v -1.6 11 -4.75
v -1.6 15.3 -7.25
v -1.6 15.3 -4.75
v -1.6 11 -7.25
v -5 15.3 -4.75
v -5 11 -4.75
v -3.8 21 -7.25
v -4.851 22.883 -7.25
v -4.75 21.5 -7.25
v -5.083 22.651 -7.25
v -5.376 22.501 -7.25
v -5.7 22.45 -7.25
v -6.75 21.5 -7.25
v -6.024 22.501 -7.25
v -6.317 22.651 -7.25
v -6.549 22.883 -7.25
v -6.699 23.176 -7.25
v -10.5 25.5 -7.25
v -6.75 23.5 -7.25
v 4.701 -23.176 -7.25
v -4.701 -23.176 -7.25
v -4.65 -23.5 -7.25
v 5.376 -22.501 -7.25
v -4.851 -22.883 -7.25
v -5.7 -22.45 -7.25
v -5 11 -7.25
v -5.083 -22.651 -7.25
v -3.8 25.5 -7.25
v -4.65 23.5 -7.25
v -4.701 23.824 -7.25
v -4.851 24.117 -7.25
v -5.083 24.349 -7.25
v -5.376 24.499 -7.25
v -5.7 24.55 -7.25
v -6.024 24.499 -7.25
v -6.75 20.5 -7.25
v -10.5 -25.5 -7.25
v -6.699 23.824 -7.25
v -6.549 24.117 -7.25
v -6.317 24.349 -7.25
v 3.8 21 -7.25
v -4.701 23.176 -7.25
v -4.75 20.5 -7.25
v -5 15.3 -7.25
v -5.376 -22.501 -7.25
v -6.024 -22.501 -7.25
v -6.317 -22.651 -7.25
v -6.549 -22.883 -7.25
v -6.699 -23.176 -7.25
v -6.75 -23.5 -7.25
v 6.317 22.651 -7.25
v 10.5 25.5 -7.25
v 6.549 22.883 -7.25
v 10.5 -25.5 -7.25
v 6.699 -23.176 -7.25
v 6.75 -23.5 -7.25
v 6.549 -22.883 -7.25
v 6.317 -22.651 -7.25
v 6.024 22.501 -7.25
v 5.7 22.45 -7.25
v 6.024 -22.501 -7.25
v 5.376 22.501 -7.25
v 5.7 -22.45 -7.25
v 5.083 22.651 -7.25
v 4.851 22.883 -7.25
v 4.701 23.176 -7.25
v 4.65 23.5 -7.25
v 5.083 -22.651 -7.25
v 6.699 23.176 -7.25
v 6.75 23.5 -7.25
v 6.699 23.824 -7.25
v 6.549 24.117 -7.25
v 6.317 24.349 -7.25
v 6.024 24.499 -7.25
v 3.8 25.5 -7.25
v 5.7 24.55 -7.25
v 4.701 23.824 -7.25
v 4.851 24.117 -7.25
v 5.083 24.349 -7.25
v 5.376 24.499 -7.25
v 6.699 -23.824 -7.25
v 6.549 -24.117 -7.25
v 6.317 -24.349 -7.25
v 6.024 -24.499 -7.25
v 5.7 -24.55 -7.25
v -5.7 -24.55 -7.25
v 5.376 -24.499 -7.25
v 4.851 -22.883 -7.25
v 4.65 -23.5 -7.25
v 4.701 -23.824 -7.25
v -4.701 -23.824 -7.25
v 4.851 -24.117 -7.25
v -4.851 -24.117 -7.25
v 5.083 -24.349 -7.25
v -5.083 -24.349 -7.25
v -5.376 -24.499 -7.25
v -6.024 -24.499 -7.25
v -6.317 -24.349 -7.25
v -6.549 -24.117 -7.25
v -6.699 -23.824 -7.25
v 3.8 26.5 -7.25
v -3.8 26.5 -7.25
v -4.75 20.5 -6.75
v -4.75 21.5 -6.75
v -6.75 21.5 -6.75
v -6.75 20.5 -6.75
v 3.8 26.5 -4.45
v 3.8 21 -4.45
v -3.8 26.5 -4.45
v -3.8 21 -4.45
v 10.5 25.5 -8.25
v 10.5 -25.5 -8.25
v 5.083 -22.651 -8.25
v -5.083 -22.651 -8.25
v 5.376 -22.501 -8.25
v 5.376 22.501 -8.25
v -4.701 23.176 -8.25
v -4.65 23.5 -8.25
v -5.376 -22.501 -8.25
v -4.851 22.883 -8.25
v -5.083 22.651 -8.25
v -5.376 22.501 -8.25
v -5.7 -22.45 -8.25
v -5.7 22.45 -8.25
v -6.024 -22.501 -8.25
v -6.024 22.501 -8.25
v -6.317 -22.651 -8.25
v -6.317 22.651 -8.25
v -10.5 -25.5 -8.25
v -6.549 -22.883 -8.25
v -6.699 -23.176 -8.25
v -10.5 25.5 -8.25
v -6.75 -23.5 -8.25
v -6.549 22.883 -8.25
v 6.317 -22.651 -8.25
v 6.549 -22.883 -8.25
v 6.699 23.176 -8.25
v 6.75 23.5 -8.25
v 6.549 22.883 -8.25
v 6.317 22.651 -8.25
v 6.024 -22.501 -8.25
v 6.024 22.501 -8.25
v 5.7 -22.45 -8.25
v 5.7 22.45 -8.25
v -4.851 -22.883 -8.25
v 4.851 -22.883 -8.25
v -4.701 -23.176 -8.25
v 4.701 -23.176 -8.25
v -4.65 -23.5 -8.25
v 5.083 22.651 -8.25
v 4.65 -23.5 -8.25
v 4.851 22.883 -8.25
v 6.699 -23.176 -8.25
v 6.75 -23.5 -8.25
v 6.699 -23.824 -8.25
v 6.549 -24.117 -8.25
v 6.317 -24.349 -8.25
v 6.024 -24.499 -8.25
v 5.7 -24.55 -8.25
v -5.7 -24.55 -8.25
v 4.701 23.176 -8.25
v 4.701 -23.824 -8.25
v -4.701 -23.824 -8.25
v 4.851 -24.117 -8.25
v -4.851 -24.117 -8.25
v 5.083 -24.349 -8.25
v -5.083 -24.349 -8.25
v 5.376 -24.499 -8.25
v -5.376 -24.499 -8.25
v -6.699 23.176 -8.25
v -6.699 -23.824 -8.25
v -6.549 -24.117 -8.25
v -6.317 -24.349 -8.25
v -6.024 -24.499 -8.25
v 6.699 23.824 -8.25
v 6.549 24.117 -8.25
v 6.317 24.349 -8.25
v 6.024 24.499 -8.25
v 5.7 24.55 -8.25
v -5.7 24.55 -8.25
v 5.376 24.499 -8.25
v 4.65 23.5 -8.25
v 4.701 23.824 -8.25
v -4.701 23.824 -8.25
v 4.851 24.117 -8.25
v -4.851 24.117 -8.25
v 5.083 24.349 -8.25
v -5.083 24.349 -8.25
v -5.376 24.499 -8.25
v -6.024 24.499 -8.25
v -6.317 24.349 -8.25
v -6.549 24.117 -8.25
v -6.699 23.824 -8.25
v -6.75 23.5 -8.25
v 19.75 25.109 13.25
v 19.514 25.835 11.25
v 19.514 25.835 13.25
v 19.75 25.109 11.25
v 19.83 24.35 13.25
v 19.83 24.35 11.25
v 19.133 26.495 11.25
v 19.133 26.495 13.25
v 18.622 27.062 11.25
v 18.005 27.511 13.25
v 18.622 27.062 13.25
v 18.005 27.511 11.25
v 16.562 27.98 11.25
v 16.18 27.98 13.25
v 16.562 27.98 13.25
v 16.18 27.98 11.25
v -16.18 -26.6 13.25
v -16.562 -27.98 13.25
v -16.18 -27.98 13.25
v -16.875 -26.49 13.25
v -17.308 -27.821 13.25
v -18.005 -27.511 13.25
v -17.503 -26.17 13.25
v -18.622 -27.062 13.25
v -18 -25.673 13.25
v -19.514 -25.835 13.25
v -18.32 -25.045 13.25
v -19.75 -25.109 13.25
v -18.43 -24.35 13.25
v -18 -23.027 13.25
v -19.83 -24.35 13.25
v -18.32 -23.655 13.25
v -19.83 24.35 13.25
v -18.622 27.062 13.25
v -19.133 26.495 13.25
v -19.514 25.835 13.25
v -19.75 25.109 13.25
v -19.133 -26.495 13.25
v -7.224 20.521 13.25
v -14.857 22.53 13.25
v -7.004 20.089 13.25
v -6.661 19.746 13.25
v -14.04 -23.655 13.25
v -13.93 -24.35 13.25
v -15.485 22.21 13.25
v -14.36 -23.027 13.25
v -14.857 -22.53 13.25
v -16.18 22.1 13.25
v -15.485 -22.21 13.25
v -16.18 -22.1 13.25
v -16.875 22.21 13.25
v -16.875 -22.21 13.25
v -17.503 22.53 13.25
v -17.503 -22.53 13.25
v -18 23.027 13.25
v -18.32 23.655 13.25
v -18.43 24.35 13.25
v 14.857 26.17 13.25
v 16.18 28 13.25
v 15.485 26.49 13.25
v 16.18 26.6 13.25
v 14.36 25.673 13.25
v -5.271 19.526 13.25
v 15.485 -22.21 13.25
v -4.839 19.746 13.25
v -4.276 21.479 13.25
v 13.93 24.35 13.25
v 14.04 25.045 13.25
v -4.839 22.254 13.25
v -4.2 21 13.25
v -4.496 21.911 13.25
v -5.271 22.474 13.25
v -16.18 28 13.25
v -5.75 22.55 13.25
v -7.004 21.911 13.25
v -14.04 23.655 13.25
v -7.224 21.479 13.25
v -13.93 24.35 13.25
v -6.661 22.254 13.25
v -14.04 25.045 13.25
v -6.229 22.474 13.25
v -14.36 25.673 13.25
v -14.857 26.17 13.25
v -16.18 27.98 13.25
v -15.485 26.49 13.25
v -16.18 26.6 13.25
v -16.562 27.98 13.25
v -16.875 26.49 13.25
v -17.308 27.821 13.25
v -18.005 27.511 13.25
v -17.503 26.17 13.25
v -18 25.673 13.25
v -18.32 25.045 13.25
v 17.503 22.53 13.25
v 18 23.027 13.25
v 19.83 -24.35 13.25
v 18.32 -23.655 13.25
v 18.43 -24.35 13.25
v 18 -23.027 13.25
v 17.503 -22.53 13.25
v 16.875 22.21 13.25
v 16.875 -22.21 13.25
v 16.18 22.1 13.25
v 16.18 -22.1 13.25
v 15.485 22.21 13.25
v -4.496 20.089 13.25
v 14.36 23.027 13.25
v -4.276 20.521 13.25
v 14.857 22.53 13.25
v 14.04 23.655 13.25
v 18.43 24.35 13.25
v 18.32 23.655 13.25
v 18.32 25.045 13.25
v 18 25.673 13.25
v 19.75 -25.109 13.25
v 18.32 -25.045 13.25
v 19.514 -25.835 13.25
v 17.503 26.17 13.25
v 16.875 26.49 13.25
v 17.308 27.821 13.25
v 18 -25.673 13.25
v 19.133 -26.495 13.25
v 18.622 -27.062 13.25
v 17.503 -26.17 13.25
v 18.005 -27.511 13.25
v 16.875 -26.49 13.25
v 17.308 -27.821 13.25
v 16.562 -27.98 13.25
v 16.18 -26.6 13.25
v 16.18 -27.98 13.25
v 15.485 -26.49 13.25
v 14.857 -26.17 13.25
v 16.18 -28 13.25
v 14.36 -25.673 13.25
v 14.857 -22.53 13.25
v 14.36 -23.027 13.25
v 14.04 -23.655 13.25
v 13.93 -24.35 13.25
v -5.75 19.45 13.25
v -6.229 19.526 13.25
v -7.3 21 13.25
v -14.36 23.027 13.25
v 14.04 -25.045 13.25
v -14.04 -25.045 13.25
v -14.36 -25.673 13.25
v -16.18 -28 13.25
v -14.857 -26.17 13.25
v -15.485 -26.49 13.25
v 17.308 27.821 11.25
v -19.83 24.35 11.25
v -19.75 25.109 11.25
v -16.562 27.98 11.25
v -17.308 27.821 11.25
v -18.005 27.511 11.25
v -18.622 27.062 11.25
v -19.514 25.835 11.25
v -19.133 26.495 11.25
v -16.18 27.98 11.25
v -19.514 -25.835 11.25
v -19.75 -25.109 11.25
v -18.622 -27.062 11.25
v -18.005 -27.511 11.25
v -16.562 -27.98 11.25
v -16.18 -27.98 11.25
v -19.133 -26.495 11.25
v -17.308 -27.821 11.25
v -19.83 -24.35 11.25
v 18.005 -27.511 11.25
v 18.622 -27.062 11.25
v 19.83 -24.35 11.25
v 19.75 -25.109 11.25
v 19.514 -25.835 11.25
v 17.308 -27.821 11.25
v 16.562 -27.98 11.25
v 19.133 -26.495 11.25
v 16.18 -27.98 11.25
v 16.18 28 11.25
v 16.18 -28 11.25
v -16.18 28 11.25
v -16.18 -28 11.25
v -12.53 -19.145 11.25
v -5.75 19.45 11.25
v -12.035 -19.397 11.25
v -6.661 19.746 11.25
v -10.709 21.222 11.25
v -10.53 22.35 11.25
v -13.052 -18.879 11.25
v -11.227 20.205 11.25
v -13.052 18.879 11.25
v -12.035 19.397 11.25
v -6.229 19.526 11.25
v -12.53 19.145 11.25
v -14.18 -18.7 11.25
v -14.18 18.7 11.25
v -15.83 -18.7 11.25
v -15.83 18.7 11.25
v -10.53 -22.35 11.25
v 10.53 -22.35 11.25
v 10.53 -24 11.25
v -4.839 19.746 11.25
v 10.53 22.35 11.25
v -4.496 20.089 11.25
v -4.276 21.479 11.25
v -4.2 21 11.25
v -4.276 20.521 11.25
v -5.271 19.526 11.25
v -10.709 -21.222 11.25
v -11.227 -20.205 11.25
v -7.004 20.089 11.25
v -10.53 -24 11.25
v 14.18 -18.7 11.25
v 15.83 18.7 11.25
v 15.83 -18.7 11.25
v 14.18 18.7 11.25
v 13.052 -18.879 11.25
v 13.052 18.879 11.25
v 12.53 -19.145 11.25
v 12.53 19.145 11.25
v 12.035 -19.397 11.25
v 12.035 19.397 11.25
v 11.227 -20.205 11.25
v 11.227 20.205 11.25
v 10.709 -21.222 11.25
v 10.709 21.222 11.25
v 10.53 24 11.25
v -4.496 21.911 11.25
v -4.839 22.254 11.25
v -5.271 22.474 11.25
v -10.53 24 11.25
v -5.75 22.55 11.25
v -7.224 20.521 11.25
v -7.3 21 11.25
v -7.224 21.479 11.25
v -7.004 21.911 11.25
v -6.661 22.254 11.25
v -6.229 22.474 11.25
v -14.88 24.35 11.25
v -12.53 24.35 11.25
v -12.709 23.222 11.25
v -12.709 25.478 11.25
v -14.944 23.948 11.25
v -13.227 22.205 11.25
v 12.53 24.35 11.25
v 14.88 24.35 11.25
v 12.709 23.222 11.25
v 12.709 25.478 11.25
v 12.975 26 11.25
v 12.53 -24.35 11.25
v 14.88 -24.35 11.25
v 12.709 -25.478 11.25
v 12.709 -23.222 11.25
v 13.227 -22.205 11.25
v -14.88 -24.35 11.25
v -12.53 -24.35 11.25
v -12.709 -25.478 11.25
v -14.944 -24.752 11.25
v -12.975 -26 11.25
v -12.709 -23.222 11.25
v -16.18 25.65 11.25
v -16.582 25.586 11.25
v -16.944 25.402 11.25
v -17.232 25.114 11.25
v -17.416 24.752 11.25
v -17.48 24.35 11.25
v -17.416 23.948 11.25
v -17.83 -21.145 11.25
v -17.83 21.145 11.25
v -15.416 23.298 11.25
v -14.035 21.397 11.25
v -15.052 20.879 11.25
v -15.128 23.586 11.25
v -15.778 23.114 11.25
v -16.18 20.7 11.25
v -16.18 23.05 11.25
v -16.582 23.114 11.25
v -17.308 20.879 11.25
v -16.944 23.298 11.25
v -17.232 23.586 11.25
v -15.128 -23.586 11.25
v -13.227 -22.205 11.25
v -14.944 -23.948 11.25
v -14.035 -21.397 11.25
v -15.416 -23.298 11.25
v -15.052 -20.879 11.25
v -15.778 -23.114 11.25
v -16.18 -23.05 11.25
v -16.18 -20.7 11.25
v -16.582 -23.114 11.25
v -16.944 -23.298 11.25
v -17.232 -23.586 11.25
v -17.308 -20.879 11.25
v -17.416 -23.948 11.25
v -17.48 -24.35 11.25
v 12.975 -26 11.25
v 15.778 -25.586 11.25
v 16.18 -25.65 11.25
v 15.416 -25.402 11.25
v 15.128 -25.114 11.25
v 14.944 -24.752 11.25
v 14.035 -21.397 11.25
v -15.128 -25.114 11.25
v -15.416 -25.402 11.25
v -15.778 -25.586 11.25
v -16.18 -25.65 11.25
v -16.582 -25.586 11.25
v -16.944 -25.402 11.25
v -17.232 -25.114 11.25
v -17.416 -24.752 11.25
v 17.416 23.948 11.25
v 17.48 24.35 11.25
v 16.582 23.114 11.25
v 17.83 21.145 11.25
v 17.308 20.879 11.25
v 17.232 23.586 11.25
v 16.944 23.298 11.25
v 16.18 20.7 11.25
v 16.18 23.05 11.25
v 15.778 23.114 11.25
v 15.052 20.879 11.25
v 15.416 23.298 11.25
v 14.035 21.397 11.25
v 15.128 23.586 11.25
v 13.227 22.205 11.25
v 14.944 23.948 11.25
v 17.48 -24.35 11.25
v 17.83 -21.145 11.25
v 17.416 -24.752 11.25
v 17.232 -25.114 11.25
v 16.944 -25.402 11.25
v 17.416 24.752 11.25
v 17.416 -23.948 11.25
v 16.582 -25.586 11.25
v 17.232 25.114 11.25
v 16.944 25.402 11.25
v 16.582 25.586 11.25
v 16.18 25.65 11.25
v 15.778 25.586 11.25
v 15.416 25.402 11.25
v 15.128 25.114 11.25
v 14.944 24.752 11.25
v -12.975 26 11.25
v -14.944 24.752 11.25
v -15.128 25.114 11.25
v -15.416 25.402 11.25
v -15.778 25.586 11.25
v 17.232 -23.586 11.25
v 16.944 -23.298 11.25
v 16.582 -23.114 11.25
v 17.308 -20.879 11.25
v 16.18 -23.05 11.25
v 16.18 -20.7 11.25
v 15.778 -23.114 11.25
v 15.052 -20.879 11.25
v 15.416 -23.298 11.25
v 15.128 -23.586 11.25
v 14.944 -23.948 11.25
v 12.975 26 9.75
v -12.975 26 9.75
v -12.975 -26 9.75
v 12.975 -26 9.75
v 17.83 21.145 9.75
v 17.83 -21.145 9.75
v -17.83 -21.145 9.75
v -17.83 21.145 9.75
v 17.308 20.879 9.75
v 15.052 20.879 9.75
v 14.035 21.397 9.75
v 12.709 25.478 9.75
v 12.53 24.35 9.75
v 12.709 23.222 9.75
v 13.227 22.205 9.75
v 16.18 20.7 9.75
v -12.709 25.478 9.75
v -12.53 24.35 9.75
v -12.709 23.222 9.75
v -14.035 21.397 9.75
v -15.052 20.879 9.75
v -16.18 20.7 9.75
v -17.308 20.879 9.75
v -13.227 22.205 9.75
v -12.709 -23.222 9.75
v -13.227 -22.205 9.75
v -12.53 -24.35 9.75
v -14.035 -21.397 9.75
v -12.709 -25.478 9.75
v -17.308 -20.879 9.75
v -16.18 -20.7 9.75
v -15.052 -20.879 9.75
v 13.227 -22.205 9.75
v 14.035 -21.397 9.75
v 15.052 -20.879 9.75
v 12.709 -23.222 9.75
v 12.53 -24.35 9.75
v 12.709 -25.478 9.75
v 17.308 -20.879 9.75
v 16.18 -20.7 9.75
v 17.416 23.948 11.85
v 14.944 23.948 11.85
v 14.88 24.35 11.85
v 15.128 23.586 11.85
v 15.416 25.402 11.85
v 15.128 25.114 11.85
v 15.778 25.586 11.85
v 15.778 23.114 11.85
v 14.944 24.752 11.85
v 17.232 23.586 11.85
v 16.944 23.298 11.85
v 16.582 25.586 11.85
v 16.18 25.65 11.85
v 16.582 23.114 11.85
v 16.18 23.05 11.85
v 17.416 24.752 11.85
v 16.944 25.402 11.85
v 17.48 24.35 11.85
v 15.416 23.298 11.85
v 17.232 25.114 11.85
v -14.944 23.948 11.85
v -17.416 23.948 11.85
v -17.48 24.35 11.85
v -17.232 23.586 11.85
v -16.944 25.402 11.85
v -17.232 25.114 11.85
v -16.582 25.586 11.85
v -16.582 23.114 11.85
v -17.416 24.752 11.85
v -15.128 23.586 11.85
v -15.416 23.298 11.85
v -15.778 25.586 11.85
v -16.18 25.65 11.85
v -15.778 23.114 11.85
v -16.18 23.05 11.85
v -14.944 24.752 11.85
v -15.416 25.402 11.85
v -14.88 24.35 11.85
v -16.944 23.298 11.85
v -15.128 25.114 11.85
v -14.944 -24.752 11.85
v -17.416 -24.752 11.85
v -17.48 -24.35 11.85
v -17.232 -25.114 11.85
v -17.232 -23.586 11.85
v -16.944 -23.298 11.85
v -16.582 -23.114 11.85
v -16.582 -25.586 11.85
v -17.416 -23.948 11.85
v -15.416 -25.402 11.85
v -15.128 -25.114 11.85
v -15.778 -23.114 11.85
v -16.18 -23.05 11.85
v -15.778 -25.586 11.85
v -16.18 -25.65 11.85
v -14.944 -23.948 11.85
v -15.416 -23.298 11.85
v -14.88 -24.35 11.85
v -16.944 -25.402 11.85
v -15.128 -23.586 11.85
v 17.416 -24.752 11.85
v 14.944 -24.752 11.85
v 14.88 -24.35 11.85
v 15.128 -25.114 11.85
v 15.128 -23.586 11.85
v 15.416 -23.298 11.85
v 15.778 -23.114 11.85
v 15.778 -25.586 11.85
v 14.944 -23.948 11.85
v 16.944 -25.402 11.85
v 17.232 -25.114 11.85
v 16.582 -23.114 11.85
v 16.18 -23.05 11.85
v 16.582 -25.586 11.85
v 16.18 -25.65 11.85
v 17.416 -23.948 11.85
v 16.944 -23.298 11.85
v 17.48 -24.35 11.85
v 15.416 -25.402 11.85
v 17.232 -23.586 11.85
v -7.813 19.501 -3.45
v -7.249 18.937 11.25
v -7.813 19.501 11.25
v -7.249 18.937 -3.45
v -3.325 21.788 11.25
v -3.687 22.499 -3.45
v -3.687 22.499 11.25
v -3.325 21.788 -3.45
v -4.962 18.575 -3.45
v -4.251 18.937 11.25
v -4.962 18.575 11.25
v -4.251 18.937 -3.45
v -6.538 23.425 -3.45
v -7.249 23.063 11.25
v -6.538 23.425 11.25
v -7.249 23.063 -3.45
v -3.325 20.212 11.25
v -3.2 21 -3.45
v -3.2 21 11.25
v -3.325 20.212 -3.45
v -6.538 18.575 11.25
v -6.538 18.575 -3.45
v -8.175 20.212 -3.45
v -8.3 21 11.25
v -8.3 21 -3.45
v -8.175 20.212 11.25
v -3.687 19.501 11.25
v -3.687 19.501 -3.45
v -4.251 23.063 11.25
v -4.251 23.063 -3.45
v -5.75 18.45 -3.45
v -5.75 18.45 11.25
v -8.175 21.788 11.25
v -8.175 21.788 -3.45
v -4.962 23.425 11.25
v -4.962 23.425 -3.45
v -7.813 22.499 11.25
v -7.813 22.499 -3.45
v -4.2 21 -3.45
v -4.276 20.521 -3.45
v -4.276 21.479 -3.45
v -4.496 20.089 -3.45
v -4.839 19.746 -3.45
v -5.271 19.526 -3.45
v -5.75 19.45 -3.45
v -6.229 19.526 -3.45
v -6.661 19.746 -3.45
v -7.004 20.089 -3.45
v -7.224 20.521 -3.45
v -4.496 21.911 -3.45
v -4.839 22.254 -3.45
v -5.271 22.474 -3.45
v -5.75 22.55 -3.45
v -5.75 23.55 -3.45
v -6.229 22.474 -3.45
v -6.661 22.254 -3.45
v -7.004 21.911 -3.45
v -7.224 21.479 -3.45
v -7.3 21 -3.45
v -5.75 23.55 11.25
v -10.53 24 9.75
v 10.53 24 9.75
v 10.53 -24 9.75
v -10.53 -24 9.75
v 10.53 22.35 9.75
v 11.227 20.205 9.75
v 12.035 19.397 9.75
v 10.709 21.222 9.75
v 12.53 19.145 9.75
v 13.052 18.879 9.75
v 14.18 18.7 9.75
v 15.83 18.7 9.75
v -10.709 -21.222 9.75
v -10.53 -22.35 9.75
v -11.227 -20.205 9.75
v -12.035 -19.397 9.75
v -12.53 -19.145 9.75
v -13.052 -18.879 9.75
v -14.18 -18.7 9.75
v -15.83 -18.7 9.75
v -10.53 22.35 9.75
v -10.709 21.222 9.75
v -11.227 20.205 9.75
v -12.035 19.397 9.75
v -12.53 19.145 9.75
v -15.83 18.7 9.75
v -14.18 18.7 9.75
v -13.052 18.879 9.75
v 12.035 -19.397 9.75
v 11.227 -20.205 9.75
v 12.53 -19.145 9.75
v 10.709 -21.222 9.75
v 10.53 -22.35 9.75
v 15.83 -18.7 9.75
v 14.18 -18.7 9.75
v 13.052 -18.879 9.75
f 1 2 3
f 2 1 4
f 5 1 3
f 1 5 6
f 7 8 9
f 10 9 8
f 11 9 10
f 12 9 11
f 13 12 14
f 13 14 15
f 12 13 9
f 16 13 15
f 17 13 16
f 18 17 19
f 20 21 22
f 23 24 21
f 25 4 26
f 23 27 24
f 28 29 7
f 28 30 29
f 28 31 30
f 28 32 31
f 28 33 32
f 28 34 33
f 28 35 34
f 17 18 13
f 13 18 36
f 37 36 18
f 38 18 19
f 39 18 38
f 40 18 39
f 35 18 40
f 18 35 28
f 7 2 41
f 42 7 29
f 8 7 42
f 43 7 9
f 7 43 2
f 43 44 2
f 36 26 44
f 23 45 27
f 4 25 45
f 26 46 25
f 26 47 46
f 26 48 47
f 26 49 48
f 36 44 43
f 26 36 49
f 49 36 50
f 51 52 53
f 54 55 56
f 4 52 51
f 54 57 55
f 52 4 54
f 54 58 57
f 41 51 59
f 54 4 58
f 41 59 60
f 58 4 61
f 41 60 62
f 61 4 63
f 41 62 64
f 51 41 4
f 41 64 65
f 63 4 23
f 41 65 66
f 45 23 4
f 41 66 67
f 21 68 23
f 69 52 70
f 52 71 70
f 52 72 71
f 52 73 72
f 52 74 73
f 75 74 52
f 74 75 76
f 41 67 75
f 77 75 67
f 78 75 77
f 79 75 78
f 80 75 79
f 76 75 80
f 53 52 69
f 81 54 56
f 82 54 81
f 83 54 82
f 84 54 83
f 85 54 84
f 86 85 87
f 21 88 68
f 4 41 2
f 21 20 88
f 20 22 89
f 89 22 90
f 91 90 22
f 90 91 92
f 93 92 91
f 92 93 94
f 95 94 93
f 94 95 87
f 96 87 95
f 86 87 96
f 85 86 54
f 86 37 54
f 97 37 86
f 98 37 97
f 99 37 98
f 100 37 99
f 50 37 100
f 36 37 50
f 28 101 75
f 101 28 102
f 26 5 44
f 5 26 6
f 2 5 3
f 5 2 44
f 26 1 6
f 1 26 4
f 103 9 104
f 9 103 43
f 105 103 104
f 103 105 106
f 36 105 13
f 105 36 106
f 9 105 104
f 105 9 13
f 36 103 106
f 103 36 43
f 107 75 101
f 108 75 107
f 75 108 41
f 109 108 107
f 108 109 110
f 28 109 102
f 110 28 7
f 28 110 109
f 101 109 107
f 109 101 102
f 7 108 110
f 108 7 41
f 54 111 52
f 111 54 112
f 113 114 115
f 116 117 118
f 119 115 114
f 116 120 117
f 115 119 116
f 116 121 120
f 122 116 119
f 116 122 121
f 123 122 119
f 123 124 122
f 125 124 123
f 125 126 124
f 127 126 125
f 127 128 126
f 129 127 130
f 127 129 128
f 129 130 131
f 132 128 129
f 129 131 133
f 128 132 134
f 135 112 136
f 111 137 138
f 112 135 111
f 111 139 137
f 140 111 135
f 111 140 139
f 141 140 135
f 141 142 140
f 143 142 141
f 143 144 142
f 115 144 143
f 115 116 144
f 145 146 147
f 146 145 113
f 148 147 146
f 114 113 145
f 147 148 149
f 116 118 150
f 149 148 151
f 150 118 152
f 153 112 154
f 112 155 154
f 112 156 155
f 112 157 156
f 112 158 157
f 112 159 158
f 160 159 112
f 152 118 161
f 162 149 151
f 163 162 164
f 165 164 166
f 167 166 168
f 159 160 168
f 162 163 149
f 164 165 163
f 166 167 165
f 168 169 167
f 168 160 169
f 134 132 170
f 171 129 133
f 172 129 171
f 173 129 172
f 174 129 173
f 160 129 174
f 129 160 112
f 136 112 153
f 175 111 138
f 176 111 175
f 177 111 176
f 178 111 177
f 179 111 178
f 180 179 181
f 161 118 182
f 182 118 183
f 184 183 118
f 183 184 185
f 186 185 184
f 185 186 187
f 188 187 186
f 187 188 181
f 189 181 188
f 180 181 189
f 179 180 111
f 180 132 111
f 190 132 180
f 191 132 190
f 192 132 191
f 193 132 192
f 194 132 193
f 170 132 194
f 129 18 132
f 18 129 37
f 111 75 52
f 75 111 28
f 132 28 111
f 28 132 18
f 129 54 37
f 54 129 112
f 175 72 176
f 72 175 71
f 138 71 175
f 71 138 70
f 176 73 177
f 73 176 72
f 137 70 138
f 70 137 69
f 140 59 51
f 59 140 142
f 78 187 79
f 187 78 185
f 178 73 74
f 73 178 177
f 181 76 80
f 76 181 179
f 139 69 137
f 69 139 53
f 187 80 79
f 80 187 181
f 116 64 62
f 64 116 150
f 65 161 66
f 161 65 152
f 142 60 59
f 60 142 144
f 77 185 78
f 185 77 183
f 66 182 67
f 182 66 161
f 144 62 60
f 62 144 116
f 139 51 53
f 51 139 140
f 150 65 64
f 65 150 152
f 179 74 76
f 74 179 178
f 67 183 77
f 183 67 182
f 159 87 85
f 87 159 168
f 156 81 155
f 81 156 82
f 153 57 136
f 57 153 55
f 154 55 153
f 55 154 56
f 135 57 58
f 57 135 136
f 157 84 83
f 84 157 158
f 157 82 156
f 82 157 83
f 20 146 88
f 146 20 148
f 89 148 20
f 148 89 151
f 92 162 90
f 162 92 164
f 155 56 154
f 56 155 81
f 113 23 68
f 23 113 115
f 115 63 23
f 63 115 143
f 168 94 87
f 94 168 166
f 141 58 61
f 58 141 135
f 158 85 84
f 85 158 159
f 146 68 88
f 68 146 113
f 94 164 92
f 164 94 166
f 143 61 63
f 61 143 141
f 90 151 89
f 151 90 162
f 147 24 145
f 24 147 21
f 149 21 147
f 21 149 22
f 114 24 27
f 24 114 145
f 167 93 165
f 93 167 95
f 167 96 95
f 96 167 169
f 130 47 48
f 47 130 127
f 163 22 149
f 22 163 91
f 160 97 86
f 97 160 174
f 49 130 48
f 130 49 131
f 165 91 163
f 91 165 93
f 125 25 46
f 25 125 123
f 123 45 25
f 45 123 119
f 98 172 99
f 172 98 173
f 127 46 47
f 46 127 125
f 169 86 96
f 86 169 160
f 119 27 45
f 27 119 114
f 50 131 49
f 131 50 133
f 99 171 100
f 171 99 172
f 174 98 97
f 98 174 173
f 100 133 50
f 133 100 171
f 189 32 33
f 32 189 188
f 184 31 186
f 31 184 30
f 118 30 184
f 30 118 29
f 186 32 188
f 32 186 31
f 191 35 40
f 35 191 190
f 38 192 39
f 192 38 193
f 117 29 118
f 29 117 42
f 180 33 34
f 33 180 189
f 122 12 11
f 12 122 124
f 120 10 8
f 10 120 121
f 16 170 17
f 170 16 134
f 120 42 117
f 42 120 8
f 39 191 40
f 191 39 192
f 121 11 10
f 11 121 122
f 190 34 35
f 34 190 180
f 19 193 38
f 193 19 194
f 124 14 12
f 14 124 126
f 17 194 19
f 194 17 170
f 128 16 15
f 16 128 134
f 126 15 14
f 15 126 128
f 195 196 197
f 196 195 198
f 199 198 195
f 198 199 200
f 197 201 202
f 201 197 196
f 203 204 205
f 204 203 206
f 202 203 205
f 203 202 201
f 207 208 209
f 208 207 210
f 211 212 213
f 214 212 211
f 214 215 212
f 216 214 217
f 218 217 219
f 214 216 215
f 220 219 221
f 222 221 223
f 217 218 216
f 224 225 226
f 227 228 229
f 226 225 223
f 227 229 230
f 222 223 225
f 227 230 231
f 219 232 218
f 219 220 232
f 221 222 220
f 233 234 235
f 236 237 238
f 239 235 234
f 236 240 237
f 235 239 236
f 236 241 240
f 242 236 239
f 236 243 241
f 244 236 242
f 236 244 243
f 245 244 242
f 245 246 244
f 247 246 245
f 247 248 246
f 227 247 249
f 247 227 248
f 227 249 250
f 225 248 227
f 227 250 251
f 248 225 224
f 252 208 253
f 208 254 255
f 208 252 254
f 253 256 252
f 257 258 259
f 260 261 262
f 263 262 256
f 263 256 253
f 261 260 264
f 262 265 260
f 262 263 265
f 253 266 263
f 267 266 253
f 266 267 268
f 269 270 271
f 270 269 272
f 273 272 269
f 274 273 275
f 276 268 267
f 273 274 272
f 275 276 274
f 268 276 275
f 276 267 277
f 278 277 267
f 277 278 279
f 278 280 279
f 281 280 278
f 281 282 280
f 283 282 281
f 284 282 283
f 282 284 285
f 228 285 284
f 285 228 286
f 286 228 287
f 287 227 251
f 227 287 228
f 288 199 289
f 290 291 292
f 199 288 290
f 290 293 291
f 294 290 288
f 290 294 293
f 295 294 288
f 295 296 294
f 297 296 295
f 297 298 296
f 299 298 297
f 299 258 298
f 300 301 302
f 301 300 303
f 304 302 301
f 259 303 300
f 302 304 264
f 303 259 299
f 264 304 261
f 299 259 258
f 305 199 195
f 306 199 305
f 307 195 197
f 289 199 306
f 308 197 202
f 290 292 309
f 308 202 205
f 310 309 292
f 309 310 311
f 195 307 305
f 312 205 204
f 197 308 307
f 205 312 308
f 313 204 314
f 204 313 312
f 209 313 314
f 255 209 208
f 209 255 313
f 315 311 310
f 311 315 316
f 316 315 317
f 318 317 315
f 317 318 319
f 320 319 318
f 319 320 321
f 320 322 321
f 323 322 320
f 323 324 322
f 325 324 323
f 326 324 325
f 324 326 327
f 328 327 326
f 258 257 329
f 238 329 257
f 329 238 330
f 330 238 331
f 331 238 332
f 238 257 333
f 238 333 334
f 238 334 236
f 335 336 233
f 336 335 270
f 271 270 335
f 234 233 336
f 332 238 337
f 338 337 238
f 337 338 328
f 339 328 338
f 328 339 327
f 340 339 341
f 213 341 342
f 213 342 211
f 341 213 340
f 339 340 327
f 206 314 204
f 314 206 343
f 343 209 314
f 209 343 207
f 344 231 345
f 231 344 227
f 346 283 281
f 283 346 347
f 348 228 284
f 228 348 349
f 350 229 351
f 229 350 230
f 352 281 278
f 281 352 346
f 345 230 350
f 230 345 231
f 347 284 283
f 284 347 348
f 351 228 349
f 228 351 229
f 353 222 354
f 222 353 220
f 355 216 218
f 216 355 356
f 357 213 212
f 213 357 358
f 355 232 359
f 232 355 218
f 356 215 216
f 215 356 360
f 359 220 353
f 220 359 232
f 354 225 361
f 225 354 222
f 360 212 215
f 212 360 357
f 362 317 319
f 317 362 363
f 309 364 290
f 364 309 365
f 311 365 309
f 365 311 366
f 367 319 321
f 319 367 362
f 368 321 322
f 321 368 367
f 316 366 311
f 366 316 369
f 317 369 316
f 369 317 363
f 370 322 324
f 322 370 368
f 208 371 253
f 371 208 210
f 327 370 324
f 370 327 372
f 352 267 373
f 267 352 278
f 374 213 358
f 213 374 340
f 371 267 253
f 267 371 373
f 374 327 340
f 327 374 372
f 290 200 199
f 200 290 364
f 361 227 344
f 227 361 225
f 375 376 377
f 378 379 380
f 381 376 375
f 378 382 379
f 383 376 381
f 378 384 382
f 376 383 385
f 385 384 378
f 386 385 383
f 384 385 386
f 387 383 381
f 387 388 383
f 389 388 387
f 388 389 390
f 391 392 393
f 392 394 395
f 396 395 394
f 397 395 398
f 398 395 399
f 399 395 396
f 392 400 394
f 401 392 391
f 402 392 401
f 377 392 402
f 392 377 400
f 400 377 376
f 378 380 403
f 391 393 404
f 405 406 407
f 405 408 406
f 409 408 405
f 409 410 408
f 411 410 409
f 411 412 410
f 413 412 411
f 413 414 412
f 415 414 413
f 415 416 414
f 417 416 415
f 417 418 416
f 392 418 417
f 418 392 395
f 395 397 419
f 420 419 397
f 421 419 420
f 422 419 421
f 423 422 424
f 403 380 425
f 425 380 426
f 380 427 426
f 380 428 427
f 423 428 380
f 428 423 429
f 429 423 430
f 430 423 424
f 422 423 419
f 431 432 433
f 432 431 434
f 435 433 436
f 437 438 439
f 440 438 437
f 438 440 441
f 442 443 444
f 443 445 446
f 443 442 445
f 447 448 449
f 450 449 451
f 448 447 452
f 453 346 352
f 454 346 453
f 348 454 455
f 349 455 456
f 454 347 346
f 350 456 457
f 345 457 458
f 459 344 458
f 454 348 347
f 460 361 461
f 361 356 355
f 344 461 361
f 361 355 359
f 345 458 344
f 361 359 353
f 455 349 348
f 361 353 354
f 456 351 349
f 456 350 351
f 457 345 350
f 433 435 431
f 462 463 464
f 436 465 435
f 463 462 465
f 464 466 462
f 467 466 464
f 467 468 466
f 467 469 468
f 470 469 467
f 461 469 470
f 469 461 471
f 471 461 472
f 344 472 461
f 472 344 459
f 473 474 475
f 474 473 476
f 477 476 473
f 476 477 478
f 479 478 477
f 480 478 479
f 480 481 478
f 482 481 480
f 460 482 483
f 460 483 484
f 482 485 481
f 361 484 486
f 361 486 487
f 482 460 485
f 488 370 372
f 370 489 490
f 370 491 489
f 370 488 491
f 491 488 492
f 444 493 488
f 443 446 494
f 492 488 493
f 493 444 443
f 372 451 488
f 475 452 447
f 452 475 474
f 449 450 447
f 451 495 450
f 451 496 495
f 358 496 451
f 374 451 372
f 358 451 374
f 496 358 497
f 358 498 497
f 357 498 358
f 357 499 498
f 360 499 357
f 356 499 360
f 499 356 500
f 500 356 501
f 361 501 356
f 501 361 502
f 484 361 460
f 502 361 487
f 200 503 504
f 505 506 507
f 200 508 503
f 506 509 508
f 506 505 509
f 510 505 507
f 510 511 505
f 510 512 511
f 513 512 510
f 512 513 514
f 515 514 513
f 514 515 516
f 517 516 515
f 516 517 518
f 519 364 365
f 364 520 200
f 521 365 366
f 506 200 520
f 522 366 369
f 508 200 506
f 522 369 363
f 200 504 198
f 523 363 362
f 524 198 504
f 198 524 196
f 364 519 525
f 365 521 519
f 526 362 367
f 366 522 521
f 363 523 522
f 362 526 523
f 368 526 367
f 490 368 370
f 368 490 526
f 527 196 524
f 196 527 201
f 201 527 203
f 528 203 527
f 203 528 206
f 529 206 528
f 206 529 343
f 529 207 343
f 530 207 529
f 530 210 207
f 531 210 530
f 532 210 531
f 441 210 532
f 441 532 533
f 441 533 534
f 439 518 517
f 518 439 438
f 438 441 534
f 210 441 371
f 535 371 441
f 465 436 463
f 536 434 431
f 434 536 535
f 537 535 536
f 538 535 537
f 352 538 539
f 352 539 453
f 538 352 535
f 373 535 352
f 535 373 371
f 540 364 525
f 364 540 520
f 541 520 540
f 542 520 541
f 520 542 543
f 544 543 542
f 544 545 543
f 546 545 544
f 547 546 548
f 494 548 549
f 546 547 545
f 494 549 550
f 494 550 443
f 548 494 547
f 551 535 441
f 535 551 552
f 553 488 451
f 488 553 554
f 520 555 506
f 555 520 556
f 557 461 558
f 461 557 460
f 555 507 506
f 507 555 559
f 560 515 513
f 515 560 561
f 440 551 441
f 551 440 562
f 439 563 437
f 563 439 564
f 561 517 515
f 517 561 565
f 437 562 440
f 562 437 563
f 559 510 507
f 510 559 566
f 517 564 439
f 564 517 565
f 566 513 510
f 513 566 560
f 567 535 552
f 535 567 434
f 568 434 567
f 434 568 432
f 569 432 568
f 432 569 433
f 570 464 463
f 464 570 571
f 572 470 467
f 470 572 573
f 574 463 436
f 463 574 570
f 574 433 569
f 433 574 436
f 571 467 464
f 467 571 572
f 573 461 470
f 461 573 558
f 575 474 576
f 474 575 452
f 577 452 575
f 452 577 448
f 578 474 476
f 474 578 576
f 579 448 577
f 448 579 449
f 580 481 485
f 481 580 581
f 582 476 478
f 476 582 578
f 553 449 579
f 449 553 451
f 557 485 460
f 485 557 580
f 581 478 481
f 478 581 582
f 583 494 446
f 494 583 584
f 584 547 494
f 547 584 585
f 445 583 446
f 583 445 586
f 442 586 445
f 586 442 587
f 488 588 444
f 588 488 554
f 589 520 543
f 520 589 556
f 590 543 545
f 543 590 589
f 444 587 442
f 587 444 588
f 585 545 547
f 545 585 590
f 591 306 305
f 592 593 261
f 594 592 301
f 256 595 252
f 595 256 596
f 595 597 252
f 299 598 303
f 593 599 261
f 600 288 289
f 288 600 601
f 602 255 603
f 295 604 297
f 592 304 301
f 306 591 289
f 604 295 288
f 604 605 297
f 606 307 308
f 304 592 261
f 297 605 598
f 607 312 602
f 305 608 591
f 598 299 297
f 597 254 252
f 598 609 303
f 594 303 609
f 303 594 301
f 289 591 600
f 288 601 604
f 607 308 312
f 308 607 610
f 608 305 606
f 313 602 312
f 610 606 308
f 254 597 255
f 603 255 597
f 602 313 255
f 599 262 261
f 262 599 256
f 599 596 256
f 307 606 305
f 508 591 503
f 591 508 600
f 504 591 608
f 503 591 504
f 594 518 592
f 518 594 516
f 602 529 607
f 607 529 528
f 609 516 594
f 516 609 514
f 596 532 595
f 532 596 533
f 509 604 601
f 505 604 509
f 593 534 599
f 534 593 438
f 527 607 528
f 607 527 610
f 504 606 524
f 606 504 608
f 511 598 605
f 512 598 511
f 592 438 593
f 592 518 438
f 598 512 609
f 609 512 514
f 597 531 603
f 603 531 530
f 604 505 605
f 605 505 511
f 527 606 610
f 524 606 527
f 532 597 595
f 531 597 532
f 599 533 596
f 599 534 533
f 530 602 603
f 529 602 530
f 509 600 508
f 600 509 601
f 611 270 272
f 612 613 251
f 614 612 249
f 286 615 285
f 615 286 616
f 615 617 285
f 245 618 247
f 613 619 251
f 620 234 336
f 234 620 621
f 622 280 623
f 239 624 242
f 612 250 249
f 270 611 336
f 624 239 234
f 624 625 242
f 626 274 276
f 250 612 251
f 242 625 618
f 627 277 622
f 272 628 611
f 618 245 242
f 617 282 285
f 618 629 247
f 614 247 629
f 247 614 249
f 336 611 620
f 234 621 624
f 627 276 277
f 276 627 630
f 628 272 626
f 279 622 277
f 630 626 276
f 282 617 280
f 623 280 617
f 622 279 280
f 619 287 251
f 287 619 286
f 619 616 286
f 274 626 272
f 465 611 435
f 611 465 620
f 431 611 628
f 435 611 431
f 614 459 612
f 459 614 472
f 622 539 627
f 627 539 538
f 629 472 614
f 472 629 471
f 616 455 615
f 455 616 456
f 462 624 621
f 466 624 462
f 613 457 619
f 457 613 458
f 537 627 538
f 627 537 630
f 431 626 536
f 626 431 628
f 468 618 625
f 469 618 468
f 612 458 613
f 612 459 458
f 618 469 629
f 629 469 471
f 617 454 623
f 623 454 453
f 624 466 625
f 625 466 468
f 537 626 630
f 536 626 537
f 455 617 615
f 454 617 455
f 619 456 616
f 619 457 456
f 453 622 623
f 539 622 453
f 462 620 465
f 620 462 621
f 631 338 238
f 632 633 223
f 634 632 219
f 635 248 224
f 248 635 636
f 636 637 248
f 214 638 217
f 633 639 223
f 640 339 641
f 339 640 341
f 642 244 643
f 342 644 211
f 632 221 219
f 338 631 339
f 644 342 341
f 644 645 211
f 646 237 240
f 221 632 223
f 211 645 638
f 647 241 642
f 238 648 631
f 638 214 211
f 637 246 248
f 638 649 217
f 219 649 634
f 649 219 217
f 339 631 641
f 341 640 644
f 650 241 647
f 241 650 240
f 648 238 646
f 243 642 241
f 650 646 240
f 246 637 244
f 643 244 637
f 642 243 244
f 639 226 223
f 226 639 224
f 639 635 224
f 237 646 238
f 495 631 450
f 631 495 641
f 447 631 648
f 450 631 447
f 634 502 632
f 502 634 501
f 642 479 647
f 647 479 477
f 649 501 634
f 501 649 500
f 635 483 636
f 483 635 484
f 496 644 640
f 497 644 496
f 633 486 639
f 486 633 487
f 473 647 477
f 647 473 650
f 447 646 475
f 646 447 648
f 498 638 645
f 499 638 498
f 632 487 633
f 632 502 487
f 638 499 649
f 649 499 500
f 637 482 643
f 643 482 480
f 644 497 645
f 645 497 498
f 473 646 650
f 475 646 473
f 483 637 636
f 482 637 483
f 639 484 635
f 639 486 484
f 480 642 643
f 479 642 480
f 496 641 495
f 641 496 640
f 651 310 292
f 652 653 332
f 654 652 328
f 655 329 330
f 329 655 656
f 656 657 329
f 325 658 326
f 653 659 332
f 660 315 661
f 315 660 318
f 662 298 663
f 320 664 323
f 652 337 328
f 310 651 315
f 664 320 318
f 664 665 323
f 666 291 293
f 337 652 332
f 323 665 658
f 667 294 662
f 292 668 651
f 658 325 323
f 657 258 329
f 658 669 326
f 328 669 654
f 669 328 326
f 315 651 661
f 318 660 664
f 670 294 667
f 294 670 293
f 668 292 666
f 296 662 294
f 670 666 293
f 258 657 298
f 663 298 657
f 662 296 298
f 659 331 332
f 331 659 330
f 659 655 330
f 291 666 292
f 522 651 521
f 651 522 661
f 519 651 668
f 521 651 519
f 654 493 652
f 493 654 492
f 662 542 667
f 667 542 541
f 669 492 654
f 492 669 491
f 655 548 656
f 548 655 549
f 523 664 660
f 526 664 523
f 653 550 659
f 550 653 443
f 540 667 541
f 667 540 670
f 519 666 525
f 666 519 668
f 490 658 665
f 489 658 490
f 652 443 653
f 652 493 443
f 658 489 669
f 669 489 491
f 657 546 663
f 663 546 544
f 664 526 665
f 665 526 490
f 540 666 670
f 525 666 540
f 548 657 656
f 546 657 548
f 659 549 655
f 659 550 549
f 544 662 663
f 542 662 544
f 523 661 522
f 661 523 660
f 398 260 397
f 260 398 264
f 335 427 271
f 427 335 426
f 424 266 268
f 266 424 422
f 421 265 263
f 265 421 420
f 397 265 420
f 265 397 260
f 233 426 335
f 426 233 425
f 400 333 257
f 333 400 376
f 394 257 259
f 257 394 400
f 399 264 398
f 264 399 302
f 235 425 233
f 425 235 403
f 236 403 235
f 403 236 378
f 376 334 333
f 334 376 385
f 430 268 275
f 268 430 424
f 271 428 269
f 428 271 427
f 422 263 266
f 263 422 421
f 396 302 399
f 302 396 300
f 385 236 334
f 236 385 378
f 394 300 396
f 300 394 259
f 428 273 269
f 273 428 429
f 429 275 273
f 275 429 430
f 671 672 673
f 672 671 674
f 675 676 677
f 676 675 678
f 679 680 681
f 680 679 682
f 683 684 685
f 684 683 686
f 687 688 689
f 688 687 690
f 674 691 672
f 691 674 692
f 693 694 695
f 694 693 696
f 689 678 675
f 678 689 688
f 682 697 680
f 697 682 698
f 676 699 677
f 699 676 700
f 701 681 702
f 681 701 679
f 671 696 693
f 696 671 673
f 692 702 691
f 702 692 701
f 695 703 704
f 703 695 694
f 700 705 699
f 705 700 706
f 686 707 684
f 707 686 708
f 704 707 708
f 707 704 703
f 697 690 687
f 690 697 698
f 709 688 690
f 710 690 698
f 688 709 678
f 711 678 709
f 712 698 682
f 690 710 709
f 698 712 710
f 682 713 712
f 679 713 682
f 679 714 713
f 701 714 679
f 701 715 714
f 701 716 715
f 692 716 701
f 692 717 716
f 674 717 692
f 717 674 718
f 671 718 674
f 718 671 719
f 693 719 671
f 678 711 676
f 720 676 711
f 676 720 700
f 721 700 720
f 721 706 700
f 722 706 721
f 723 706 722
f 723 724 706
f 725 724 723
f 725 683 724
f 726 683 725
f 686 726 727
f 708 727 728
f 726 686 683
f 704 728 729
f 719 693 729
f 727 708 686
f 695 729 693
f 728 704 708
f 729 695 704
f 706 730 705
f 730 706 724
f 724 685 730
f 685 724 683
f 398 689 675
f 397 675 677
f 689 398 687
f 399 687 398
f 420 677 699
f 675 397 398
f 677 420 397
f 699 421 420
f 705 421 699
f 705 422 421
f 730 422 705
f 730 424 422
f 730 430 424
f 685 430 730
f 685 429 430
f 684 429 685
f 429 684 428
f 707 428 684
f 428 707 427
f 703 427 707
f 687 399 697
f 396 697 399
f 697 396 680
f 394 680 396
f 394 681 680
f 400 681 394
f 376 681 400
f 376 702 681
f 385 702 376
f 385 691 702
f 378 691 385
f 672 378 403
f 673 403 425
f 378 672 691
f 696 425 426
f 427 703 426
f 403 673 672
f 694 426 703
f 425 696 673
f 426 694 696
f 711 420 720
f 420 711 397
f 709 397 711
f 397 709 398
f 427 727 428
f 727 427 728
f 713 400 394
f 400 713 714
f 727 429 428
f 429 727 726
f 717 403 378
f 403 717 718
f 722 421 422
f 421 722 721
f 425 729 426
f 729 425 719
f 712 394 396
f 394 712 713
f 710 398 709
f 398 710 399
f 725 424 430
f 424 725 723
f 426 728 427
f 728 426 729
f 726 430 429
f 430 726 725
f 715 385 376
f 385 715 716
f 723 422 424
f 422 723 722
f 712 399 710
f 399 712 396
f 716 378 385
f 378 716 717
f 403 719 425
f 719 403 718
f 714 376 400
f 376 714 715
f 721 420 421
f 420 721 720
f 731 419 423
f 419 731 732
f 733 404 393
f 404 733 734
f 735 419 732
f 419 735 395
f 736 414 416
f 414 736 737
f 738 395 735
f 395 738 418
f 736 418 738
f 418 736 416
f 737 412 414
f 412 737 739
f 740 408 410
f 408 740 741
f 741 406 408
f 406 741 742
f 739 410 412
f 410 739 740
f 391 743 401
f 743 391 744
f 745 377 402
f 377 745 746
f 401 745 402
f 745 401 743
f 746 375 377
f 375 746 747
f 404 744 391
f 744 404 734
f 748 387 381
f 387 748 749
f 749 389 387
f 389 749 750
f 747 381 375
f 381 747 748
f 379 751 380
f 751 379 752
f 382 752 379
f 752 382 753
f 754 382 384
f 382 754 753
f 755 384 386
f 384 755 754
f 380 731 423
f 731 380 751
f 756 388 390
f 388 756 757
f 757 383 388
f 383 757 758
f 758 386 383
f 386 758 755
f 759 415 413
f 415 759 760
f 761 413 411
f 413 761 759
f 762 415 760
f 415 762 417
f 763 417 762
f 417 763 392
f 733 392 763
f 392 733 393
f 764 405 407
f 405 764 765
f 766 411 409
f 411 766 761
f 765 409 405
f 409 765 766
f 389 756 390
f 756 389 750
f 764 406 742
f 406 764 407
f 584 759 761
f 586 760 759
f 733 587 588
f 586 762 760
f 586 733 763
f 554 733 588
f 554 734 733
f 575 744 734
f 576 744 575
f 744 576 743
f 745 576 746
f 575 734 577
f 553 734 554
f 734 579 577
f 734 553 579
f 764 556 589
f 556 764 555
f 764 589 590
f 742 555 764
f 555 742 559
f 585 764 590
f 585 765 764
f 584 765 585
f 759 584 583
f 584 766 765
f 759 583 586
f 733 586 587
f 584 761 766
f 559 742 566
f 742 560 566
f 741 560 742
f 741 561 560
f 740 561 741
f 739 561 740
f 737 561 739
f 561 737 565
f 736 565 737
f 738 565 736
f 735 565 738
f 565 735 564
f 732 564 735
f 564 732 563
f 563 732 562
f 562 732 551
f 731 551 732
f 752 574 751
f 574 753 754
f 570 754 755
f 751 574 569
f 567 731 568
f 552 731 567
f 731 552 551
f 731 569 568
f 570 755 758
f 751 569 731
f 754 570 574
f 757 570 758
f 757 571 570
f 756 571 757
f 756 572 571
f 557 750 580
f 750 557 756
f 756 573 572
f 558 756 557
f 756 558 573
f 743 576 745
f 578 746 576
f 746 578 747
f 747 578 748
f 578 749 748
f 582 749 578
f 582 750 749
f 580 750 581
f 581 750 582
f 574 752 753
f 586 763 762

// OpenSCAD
// file: utilities.scad
module corners(x_size, y_size){
    for(p = [[x_size/2, y_size/2, 0],
            [-x_size/2, y_size/2, 0],
            [-x_size/2, -y_size/2, 0],
            [x_size/2, -y_size/2, 0]]) {
        translate(p){
            children();
        }
    }
}

module rounded_rectangle(x, y, z, radius){
    union(){
        cube([x - 2 * radius, y, z], center=true);
        cube([x, y - 2 * radius, z], center=true);

        corners(x - 2 * radius, y - 2 * radius){
            cylinder(r = radius, h = z, center=true, $fn=30);
        }
    }
}

module bolt_hole(diameter, countersink_depth){
//    countersink_depth = 1.4;
//    diameter = 2.5;
    union(){
        rotate_extrude(angle=360, $fn=20){
            polygon([[0,0], [0, countersink_depth], [diameter/2, countersink_depth], [2.25, 0]]);
        }
        translate([0, 0, countersink_depth/2]){
            cylinder(r=diameter/2, h=20, $fn=20);
            
        }
    }
}

// See https://cubehero.com/2013/12/31/creating-cookie-cutters-using-offsets-in-openscad/comment-page-1/
bounding_box = [5000, 5000, 5000];
module invert(bounds = bounding_box) {
    difference() {
        cube(bounds, true);
        children();
    }        
}

module inset(thickness, bounds = bounding_box){
    invert(bounds * 0.9){
        minkowski(){
            invert(){
                children();
            }
            cube([2 * thickness, 2 * thickness, 2 * thickness], center=true);
        }
    }
}

module xy_inset(thickness, bounds = bounding_box){
    difference(){
        children();

        scale([1, 1, 2]){
            inset(thickness, bounds) {
                children();
            }
        }
    }
}
// file: pico.scad
pico_x = 21;
pico_y = 51;
pico_z = 1;
pico_hole_d = 2.1;
pico_hole_x_pos = 11.4 / 2;
pico_hole_y_pos = (pico_y / 2) - 2;

button_x = 3.4;
button_y = 4.3;
button_z = 2.5;
button_x_pos = -((pico_x / 2) - 5.5);
button_y_pos = ((pico_y / 2) - 14.5);

led_x = 2;
led_y = 1;
led_z = 0.5;
led_x_pos = -(pico_x / 2 - 3.75);
led_y_pos = pico_y / 2 - 5;

usb_x = 7.6;
usb_y = 5.5;
usb_z = 2.8;
usb_x_pos = 0;
usb_y_pos = pico_y/2 - 4.5;
usb_z_pos = 0;



module pico_holes(){
    for (i = [[pico_hole_x_pos, pico_hole_y_pos, 0], 
           [pico_hole_x_pos, -pico_hole_y_pos, 0], 
           [-pico_hole_x_pos, -pico_hole_y_pos, 0], 
           [-pico_hole_x_pos, pico_hole_y_pos, 0]]){
        translate(i){
            children();
        }
    }
}

module pico_button(){
    translate([button_x_pos + button_x/2, button_y_pos + button_y/2, 0]){
        children();
    }
}

module pico_led(){
    translate([led_x_pos + led_x/2, led_y_pos + led_y / 2, 0]){
        children();
    }
}

module pico_usb(){
    translate([usb_x_pos, usb_y_pos + usb_y/2, usb_z_pos]){
        children();
    }
}

module pico(){
    difference(){
        union(){
            cube([pico_x, pico_y, pico_z], center=true);
            translate([0, 0, pico_z/2]){
                pico_button(){
                    translate([0, 0, button_z/2]){
                        cube([button_x, button_y, button_z], center=true);
                    }
                }
                pico_led(){
                    translate([0, 0, led_z/2]){
                        cube([led_x, led_y, led_z], center=true);
                    }
                }
                pico_usb(){
                    translate([0, 0, usb_z/2]){
                        cube([usb_x, usb_y, usb_z], center=true);
                    }
                }                
            }
        }
        
        pico_holes(){
            cylinder(h = 2* pico_z, d = pico_hole_d, center=true, $fn=20);
        }
    }
}
// main file
include <pico.scad>;
include <utilities.scad>;

pillar_h = 3;
pillar_d_inner = 3;
pillar_d_outer = 6;

case_insert_d = 3.3;
case_insert_h = 5;

usb_hole_clearance = 2;
usb_hole_x = usb_x + usb_hole_clearance;
usb_hole_z = usb_z + usb_hole_clearance;

wall_thickness = 2;

port_leeway = 0.3;
serial_x = 10;
serial_y = 6;
serial_z = 7;
debug_x = 12.4;
debug_y = 6;
debug_z = 7;

connector_pcb_x = 25.6 - 2.54;
connector_pcb_y = 15;
connector_pcb_z = 1.6;
debug_y_offset = 1.7;
connector_x_offset = 7.9;
connector_hole_d = 2.6;
connector_hole_separation = 2.54 * 7;
connector_pcb_pillar_h = debug_z - wall_thickness;
connector_pcb_pico_separation = 2;
connector_hole_countersink_depth = 1.4;
lid_insert_depth = 1.5;



corner_radius = case_insert_d / 2 + wall_thickness;
corner_clearance = 1;
enclosure_x = connector_pcb_x + 2 * (case_insert_d + wall_thickness + corner_clearance);
enclosure_y = pico_y + corner_clearance;
enclosure_z = connector_pcb_y + pico_z + pillar_h + connector_pcb_pico_separation + lid_insert_depth;

light_pipe_diameter = 3.1;
light_pipe_support_depth = enclosure_z - pico_z - pillar_h - usb_z - 1;


module connector_pcb_holes(){
    translate([-connector_hole_separation/2,0,0]){
        children();
    }
    translate([connector_hole_separation/2,0,0]){
        children();
    }
}

module connector_pcb_serial_pos(){
    translate([connector_x_offset + (serial_x - connector_pcb_x)/2, debug_y_offset +  (serial_y - connector_pcb_y)/2,(serial_z + connector_pcb_z)/2]){
        children();
    }
}

module connector_pcb_debug_pos(){
    translate([0, (connector_pcb_y - debug_y)/2,(debug_z + connector_pcb_z)/2]) {
        children();
    }
}

module connector_pcb_pos(){
    pico_top_pos = pico_z- enclosure_z/2 + pillar_h;
    sep = pico_top_pos + connector_pcb_y/2;
    translate([0, connector_pcb_pillar_h + connector_pcb_z/2 -enclosure_y/2, sep + connector_pcb_pico_separation]){
        rotate([90, 0, 0]){
            children();
        }
    }
}

module connector_pcb(){
    union(){
        difference(){
            cube([connector_pcb_x, connector_pcb_y, connector_pcb_z], center=true);
            
            connector_pcb_holes(){
                cylinder(h=2*connector_pcb_z, d=connector_hole_d, center=true, $fn =20);
            }
        }
        connector_pcb_serial_pos(){
            cube([serial_x, serial_y, serial_z], center=true);
        }
        connector_pcb_debug_pos(){
            cube([debug_x, debug_y, debug_z], center=true);
        }
    }
}

module enclosure_shape(){
    union(){
        // Basic outline
        difference(){
            rounded_rectangle(enclosure_x + 2* wall_thickness, enclosure_y + 2* wall_thickness, enclosure_z + 2* wall_thickness, corner_radius);
            rounded_rectangle(enclosure_x, enclosure_y, enclosure_z, corner_radius);
        }
        // Corner radii for case bolts
        difference(){
            intersection(){
                cube([enclosure_x, enclosure_y, enclosure_z], center=true);
        
                corners(enclosure_x - case_insert_d, enclosure_y - case_insert_d){
                    cylinder(r = corner_radius, h = enclosure_z, center=true, $fn=20);
                }
            }
        }
    }
}


module enclosure_main(){
    difference(){
        union(){
            enclosure_shape();
            
            // Pillars for connector PCB
            connector_pcb_pos(){
                connector_pcb_holes(){
                    translate([-0,0, (connector_pcb_pillar_h + connector_pcb_z)/2]){
                        difference(){
                            cylinder(d=pillar_d_outer, h= connector_pcb_pillar_h, center=true, $fn=20);
                            cylinder(d=connector_hole_d, h= connector_pcb_pillar_h + 1, center=true, $fn=20);
                        }
                    }
                }
            }
            
            // Base pillars to support pico
            translate([0,0,(pillar_h-enclosure_z)/2]){
                pico_holes(){
                    difference(){
                        cylinder(d=pillar_d_outer, h= pillar_h, center=true, $fn=20);
                        cylinder(d=pillar_d_inner, h= pillar_h + 1, center=true, $fn=20);
                    }
                }
            }
        }
        // Remove top
        translate([0, 0, enclosure_z/2 + wall_thickness]){
            cube([2 * enclosure_x, 2 * enclosure_y, 2 * wall_thickness], center=true);
        }
        // Add holes for corner heat-set inserts
        corners(enclosure_x - case_insert_d, enclosure_y - case_insert_d){
            translate([0, 0, (enclosure_z - case_insert_h)/2]){
                cylinder(d=case_insert_d, h=case_insert_h, center=true, $fn=20);
            }
        }
        // Hole for Pico USB port
        translate([0, 0,  pillar_h + pico_z + (usb_hole_z - usb_hole_clearance -enclosure_z)/2]){
            pico_usb(){
                cube([usb_hole_x, usb_y + corner_clearance  + 2* wall_thickness, usb_hole_z], center=true);
            }
        }
        
        // Debug and serial output holes
        connector_pcb_pos(){
            connector_pcb_serial_pos(){
                cube([serial_x + 2 * port_leeway, serial_y + 2 * port_leeway, serial_z * 2], center=true);
            }
            connector_pcb_debug_pos(){
                cube([debug_x + 2 * port_leeway, debug_y + 2 * port_leeway, debug_z * 2], center=true);
            }
            
            // Connector PCB mounting bolt holes
            connector_pcb_holes(){
                translate([-0,0,connector_pcb_pillar_h + wall_thickness + connector_pcb_z/2 + 0.001]){
                    rotate([180,0,0]){
                        bolt_hole(connector_hole_d, connector_hole_countersink_depth);
                    }
                }
            }

        }
    }
}

module enclosure_lid(){
    union(){
        difference(){
            union(){
                enclosure_shape();
                

            }
            // Remove top
            translate([0, 0, - wall_thickness]){
                cube([2 * enclosure_x, 2 * enclosure_y, enclosure_z + 2 * wall_thickness], center=true);
            }
            
            // Light pipe top hole
            pico_led(){
                cylinder(d=light_pipe_diameter, h=enclosure_z *2, $fn=20);
            }
            
            // Bolt holes
            corners(enclosure_x - case_insert_d, enclosure_y - case_insert_d){
                translate([0, 0, (enclosure_z)/2 + wall_thickness]){
                    rotate([180, 0, 0]){
                        bolt_hole(connector_hole_d, connector_hole_countersink_depth);
                    }
                }
            }
        }
        
        // Light pipe support tube
        pico_led(){
            translate([0,0,(enclosure_z - light_pipe_support_depth)/2]){
                difference(){
                    cylinder(d=light_pipe_diameter + wall_thickness, h= light_pipe_support_depth, center=true, $fn=20);
                    cylinder(d=light_pipe_diameter, h= light_pipe_support_depth + 1, center=true, $fn=20);
                }
            }
            
        }
        // Lid inner ridge
        difference(){
            xy_inset(wall_thickness){
                difference(){
                    cube([enclosure_x, enclosure_y, enclosure_z], center=true);
                    enclosure_shape();
                }
            }
    
            translate([0,0,-lid_insert_depth]){
                cube([2 * enclosure_x, 2 * enclosure_y, enclosure_z], center=true);
            }
        }        
    }
}


translate([0,0,(pico_z-enclosure_z)/2 + pillar_h]){
    pico();
}


connector_pcb_pos(){
//    connector_pcb();
}

translate([0,0,0]){
    enclosure_lid();
}

difference(){

//    enclosure_main();
//    enclosure_shape2();
//    translate([0,0,enclosure_z/2 +50 - wall_thickness]){
//        cube([100, 100, 100], center=true);
//    }
}
